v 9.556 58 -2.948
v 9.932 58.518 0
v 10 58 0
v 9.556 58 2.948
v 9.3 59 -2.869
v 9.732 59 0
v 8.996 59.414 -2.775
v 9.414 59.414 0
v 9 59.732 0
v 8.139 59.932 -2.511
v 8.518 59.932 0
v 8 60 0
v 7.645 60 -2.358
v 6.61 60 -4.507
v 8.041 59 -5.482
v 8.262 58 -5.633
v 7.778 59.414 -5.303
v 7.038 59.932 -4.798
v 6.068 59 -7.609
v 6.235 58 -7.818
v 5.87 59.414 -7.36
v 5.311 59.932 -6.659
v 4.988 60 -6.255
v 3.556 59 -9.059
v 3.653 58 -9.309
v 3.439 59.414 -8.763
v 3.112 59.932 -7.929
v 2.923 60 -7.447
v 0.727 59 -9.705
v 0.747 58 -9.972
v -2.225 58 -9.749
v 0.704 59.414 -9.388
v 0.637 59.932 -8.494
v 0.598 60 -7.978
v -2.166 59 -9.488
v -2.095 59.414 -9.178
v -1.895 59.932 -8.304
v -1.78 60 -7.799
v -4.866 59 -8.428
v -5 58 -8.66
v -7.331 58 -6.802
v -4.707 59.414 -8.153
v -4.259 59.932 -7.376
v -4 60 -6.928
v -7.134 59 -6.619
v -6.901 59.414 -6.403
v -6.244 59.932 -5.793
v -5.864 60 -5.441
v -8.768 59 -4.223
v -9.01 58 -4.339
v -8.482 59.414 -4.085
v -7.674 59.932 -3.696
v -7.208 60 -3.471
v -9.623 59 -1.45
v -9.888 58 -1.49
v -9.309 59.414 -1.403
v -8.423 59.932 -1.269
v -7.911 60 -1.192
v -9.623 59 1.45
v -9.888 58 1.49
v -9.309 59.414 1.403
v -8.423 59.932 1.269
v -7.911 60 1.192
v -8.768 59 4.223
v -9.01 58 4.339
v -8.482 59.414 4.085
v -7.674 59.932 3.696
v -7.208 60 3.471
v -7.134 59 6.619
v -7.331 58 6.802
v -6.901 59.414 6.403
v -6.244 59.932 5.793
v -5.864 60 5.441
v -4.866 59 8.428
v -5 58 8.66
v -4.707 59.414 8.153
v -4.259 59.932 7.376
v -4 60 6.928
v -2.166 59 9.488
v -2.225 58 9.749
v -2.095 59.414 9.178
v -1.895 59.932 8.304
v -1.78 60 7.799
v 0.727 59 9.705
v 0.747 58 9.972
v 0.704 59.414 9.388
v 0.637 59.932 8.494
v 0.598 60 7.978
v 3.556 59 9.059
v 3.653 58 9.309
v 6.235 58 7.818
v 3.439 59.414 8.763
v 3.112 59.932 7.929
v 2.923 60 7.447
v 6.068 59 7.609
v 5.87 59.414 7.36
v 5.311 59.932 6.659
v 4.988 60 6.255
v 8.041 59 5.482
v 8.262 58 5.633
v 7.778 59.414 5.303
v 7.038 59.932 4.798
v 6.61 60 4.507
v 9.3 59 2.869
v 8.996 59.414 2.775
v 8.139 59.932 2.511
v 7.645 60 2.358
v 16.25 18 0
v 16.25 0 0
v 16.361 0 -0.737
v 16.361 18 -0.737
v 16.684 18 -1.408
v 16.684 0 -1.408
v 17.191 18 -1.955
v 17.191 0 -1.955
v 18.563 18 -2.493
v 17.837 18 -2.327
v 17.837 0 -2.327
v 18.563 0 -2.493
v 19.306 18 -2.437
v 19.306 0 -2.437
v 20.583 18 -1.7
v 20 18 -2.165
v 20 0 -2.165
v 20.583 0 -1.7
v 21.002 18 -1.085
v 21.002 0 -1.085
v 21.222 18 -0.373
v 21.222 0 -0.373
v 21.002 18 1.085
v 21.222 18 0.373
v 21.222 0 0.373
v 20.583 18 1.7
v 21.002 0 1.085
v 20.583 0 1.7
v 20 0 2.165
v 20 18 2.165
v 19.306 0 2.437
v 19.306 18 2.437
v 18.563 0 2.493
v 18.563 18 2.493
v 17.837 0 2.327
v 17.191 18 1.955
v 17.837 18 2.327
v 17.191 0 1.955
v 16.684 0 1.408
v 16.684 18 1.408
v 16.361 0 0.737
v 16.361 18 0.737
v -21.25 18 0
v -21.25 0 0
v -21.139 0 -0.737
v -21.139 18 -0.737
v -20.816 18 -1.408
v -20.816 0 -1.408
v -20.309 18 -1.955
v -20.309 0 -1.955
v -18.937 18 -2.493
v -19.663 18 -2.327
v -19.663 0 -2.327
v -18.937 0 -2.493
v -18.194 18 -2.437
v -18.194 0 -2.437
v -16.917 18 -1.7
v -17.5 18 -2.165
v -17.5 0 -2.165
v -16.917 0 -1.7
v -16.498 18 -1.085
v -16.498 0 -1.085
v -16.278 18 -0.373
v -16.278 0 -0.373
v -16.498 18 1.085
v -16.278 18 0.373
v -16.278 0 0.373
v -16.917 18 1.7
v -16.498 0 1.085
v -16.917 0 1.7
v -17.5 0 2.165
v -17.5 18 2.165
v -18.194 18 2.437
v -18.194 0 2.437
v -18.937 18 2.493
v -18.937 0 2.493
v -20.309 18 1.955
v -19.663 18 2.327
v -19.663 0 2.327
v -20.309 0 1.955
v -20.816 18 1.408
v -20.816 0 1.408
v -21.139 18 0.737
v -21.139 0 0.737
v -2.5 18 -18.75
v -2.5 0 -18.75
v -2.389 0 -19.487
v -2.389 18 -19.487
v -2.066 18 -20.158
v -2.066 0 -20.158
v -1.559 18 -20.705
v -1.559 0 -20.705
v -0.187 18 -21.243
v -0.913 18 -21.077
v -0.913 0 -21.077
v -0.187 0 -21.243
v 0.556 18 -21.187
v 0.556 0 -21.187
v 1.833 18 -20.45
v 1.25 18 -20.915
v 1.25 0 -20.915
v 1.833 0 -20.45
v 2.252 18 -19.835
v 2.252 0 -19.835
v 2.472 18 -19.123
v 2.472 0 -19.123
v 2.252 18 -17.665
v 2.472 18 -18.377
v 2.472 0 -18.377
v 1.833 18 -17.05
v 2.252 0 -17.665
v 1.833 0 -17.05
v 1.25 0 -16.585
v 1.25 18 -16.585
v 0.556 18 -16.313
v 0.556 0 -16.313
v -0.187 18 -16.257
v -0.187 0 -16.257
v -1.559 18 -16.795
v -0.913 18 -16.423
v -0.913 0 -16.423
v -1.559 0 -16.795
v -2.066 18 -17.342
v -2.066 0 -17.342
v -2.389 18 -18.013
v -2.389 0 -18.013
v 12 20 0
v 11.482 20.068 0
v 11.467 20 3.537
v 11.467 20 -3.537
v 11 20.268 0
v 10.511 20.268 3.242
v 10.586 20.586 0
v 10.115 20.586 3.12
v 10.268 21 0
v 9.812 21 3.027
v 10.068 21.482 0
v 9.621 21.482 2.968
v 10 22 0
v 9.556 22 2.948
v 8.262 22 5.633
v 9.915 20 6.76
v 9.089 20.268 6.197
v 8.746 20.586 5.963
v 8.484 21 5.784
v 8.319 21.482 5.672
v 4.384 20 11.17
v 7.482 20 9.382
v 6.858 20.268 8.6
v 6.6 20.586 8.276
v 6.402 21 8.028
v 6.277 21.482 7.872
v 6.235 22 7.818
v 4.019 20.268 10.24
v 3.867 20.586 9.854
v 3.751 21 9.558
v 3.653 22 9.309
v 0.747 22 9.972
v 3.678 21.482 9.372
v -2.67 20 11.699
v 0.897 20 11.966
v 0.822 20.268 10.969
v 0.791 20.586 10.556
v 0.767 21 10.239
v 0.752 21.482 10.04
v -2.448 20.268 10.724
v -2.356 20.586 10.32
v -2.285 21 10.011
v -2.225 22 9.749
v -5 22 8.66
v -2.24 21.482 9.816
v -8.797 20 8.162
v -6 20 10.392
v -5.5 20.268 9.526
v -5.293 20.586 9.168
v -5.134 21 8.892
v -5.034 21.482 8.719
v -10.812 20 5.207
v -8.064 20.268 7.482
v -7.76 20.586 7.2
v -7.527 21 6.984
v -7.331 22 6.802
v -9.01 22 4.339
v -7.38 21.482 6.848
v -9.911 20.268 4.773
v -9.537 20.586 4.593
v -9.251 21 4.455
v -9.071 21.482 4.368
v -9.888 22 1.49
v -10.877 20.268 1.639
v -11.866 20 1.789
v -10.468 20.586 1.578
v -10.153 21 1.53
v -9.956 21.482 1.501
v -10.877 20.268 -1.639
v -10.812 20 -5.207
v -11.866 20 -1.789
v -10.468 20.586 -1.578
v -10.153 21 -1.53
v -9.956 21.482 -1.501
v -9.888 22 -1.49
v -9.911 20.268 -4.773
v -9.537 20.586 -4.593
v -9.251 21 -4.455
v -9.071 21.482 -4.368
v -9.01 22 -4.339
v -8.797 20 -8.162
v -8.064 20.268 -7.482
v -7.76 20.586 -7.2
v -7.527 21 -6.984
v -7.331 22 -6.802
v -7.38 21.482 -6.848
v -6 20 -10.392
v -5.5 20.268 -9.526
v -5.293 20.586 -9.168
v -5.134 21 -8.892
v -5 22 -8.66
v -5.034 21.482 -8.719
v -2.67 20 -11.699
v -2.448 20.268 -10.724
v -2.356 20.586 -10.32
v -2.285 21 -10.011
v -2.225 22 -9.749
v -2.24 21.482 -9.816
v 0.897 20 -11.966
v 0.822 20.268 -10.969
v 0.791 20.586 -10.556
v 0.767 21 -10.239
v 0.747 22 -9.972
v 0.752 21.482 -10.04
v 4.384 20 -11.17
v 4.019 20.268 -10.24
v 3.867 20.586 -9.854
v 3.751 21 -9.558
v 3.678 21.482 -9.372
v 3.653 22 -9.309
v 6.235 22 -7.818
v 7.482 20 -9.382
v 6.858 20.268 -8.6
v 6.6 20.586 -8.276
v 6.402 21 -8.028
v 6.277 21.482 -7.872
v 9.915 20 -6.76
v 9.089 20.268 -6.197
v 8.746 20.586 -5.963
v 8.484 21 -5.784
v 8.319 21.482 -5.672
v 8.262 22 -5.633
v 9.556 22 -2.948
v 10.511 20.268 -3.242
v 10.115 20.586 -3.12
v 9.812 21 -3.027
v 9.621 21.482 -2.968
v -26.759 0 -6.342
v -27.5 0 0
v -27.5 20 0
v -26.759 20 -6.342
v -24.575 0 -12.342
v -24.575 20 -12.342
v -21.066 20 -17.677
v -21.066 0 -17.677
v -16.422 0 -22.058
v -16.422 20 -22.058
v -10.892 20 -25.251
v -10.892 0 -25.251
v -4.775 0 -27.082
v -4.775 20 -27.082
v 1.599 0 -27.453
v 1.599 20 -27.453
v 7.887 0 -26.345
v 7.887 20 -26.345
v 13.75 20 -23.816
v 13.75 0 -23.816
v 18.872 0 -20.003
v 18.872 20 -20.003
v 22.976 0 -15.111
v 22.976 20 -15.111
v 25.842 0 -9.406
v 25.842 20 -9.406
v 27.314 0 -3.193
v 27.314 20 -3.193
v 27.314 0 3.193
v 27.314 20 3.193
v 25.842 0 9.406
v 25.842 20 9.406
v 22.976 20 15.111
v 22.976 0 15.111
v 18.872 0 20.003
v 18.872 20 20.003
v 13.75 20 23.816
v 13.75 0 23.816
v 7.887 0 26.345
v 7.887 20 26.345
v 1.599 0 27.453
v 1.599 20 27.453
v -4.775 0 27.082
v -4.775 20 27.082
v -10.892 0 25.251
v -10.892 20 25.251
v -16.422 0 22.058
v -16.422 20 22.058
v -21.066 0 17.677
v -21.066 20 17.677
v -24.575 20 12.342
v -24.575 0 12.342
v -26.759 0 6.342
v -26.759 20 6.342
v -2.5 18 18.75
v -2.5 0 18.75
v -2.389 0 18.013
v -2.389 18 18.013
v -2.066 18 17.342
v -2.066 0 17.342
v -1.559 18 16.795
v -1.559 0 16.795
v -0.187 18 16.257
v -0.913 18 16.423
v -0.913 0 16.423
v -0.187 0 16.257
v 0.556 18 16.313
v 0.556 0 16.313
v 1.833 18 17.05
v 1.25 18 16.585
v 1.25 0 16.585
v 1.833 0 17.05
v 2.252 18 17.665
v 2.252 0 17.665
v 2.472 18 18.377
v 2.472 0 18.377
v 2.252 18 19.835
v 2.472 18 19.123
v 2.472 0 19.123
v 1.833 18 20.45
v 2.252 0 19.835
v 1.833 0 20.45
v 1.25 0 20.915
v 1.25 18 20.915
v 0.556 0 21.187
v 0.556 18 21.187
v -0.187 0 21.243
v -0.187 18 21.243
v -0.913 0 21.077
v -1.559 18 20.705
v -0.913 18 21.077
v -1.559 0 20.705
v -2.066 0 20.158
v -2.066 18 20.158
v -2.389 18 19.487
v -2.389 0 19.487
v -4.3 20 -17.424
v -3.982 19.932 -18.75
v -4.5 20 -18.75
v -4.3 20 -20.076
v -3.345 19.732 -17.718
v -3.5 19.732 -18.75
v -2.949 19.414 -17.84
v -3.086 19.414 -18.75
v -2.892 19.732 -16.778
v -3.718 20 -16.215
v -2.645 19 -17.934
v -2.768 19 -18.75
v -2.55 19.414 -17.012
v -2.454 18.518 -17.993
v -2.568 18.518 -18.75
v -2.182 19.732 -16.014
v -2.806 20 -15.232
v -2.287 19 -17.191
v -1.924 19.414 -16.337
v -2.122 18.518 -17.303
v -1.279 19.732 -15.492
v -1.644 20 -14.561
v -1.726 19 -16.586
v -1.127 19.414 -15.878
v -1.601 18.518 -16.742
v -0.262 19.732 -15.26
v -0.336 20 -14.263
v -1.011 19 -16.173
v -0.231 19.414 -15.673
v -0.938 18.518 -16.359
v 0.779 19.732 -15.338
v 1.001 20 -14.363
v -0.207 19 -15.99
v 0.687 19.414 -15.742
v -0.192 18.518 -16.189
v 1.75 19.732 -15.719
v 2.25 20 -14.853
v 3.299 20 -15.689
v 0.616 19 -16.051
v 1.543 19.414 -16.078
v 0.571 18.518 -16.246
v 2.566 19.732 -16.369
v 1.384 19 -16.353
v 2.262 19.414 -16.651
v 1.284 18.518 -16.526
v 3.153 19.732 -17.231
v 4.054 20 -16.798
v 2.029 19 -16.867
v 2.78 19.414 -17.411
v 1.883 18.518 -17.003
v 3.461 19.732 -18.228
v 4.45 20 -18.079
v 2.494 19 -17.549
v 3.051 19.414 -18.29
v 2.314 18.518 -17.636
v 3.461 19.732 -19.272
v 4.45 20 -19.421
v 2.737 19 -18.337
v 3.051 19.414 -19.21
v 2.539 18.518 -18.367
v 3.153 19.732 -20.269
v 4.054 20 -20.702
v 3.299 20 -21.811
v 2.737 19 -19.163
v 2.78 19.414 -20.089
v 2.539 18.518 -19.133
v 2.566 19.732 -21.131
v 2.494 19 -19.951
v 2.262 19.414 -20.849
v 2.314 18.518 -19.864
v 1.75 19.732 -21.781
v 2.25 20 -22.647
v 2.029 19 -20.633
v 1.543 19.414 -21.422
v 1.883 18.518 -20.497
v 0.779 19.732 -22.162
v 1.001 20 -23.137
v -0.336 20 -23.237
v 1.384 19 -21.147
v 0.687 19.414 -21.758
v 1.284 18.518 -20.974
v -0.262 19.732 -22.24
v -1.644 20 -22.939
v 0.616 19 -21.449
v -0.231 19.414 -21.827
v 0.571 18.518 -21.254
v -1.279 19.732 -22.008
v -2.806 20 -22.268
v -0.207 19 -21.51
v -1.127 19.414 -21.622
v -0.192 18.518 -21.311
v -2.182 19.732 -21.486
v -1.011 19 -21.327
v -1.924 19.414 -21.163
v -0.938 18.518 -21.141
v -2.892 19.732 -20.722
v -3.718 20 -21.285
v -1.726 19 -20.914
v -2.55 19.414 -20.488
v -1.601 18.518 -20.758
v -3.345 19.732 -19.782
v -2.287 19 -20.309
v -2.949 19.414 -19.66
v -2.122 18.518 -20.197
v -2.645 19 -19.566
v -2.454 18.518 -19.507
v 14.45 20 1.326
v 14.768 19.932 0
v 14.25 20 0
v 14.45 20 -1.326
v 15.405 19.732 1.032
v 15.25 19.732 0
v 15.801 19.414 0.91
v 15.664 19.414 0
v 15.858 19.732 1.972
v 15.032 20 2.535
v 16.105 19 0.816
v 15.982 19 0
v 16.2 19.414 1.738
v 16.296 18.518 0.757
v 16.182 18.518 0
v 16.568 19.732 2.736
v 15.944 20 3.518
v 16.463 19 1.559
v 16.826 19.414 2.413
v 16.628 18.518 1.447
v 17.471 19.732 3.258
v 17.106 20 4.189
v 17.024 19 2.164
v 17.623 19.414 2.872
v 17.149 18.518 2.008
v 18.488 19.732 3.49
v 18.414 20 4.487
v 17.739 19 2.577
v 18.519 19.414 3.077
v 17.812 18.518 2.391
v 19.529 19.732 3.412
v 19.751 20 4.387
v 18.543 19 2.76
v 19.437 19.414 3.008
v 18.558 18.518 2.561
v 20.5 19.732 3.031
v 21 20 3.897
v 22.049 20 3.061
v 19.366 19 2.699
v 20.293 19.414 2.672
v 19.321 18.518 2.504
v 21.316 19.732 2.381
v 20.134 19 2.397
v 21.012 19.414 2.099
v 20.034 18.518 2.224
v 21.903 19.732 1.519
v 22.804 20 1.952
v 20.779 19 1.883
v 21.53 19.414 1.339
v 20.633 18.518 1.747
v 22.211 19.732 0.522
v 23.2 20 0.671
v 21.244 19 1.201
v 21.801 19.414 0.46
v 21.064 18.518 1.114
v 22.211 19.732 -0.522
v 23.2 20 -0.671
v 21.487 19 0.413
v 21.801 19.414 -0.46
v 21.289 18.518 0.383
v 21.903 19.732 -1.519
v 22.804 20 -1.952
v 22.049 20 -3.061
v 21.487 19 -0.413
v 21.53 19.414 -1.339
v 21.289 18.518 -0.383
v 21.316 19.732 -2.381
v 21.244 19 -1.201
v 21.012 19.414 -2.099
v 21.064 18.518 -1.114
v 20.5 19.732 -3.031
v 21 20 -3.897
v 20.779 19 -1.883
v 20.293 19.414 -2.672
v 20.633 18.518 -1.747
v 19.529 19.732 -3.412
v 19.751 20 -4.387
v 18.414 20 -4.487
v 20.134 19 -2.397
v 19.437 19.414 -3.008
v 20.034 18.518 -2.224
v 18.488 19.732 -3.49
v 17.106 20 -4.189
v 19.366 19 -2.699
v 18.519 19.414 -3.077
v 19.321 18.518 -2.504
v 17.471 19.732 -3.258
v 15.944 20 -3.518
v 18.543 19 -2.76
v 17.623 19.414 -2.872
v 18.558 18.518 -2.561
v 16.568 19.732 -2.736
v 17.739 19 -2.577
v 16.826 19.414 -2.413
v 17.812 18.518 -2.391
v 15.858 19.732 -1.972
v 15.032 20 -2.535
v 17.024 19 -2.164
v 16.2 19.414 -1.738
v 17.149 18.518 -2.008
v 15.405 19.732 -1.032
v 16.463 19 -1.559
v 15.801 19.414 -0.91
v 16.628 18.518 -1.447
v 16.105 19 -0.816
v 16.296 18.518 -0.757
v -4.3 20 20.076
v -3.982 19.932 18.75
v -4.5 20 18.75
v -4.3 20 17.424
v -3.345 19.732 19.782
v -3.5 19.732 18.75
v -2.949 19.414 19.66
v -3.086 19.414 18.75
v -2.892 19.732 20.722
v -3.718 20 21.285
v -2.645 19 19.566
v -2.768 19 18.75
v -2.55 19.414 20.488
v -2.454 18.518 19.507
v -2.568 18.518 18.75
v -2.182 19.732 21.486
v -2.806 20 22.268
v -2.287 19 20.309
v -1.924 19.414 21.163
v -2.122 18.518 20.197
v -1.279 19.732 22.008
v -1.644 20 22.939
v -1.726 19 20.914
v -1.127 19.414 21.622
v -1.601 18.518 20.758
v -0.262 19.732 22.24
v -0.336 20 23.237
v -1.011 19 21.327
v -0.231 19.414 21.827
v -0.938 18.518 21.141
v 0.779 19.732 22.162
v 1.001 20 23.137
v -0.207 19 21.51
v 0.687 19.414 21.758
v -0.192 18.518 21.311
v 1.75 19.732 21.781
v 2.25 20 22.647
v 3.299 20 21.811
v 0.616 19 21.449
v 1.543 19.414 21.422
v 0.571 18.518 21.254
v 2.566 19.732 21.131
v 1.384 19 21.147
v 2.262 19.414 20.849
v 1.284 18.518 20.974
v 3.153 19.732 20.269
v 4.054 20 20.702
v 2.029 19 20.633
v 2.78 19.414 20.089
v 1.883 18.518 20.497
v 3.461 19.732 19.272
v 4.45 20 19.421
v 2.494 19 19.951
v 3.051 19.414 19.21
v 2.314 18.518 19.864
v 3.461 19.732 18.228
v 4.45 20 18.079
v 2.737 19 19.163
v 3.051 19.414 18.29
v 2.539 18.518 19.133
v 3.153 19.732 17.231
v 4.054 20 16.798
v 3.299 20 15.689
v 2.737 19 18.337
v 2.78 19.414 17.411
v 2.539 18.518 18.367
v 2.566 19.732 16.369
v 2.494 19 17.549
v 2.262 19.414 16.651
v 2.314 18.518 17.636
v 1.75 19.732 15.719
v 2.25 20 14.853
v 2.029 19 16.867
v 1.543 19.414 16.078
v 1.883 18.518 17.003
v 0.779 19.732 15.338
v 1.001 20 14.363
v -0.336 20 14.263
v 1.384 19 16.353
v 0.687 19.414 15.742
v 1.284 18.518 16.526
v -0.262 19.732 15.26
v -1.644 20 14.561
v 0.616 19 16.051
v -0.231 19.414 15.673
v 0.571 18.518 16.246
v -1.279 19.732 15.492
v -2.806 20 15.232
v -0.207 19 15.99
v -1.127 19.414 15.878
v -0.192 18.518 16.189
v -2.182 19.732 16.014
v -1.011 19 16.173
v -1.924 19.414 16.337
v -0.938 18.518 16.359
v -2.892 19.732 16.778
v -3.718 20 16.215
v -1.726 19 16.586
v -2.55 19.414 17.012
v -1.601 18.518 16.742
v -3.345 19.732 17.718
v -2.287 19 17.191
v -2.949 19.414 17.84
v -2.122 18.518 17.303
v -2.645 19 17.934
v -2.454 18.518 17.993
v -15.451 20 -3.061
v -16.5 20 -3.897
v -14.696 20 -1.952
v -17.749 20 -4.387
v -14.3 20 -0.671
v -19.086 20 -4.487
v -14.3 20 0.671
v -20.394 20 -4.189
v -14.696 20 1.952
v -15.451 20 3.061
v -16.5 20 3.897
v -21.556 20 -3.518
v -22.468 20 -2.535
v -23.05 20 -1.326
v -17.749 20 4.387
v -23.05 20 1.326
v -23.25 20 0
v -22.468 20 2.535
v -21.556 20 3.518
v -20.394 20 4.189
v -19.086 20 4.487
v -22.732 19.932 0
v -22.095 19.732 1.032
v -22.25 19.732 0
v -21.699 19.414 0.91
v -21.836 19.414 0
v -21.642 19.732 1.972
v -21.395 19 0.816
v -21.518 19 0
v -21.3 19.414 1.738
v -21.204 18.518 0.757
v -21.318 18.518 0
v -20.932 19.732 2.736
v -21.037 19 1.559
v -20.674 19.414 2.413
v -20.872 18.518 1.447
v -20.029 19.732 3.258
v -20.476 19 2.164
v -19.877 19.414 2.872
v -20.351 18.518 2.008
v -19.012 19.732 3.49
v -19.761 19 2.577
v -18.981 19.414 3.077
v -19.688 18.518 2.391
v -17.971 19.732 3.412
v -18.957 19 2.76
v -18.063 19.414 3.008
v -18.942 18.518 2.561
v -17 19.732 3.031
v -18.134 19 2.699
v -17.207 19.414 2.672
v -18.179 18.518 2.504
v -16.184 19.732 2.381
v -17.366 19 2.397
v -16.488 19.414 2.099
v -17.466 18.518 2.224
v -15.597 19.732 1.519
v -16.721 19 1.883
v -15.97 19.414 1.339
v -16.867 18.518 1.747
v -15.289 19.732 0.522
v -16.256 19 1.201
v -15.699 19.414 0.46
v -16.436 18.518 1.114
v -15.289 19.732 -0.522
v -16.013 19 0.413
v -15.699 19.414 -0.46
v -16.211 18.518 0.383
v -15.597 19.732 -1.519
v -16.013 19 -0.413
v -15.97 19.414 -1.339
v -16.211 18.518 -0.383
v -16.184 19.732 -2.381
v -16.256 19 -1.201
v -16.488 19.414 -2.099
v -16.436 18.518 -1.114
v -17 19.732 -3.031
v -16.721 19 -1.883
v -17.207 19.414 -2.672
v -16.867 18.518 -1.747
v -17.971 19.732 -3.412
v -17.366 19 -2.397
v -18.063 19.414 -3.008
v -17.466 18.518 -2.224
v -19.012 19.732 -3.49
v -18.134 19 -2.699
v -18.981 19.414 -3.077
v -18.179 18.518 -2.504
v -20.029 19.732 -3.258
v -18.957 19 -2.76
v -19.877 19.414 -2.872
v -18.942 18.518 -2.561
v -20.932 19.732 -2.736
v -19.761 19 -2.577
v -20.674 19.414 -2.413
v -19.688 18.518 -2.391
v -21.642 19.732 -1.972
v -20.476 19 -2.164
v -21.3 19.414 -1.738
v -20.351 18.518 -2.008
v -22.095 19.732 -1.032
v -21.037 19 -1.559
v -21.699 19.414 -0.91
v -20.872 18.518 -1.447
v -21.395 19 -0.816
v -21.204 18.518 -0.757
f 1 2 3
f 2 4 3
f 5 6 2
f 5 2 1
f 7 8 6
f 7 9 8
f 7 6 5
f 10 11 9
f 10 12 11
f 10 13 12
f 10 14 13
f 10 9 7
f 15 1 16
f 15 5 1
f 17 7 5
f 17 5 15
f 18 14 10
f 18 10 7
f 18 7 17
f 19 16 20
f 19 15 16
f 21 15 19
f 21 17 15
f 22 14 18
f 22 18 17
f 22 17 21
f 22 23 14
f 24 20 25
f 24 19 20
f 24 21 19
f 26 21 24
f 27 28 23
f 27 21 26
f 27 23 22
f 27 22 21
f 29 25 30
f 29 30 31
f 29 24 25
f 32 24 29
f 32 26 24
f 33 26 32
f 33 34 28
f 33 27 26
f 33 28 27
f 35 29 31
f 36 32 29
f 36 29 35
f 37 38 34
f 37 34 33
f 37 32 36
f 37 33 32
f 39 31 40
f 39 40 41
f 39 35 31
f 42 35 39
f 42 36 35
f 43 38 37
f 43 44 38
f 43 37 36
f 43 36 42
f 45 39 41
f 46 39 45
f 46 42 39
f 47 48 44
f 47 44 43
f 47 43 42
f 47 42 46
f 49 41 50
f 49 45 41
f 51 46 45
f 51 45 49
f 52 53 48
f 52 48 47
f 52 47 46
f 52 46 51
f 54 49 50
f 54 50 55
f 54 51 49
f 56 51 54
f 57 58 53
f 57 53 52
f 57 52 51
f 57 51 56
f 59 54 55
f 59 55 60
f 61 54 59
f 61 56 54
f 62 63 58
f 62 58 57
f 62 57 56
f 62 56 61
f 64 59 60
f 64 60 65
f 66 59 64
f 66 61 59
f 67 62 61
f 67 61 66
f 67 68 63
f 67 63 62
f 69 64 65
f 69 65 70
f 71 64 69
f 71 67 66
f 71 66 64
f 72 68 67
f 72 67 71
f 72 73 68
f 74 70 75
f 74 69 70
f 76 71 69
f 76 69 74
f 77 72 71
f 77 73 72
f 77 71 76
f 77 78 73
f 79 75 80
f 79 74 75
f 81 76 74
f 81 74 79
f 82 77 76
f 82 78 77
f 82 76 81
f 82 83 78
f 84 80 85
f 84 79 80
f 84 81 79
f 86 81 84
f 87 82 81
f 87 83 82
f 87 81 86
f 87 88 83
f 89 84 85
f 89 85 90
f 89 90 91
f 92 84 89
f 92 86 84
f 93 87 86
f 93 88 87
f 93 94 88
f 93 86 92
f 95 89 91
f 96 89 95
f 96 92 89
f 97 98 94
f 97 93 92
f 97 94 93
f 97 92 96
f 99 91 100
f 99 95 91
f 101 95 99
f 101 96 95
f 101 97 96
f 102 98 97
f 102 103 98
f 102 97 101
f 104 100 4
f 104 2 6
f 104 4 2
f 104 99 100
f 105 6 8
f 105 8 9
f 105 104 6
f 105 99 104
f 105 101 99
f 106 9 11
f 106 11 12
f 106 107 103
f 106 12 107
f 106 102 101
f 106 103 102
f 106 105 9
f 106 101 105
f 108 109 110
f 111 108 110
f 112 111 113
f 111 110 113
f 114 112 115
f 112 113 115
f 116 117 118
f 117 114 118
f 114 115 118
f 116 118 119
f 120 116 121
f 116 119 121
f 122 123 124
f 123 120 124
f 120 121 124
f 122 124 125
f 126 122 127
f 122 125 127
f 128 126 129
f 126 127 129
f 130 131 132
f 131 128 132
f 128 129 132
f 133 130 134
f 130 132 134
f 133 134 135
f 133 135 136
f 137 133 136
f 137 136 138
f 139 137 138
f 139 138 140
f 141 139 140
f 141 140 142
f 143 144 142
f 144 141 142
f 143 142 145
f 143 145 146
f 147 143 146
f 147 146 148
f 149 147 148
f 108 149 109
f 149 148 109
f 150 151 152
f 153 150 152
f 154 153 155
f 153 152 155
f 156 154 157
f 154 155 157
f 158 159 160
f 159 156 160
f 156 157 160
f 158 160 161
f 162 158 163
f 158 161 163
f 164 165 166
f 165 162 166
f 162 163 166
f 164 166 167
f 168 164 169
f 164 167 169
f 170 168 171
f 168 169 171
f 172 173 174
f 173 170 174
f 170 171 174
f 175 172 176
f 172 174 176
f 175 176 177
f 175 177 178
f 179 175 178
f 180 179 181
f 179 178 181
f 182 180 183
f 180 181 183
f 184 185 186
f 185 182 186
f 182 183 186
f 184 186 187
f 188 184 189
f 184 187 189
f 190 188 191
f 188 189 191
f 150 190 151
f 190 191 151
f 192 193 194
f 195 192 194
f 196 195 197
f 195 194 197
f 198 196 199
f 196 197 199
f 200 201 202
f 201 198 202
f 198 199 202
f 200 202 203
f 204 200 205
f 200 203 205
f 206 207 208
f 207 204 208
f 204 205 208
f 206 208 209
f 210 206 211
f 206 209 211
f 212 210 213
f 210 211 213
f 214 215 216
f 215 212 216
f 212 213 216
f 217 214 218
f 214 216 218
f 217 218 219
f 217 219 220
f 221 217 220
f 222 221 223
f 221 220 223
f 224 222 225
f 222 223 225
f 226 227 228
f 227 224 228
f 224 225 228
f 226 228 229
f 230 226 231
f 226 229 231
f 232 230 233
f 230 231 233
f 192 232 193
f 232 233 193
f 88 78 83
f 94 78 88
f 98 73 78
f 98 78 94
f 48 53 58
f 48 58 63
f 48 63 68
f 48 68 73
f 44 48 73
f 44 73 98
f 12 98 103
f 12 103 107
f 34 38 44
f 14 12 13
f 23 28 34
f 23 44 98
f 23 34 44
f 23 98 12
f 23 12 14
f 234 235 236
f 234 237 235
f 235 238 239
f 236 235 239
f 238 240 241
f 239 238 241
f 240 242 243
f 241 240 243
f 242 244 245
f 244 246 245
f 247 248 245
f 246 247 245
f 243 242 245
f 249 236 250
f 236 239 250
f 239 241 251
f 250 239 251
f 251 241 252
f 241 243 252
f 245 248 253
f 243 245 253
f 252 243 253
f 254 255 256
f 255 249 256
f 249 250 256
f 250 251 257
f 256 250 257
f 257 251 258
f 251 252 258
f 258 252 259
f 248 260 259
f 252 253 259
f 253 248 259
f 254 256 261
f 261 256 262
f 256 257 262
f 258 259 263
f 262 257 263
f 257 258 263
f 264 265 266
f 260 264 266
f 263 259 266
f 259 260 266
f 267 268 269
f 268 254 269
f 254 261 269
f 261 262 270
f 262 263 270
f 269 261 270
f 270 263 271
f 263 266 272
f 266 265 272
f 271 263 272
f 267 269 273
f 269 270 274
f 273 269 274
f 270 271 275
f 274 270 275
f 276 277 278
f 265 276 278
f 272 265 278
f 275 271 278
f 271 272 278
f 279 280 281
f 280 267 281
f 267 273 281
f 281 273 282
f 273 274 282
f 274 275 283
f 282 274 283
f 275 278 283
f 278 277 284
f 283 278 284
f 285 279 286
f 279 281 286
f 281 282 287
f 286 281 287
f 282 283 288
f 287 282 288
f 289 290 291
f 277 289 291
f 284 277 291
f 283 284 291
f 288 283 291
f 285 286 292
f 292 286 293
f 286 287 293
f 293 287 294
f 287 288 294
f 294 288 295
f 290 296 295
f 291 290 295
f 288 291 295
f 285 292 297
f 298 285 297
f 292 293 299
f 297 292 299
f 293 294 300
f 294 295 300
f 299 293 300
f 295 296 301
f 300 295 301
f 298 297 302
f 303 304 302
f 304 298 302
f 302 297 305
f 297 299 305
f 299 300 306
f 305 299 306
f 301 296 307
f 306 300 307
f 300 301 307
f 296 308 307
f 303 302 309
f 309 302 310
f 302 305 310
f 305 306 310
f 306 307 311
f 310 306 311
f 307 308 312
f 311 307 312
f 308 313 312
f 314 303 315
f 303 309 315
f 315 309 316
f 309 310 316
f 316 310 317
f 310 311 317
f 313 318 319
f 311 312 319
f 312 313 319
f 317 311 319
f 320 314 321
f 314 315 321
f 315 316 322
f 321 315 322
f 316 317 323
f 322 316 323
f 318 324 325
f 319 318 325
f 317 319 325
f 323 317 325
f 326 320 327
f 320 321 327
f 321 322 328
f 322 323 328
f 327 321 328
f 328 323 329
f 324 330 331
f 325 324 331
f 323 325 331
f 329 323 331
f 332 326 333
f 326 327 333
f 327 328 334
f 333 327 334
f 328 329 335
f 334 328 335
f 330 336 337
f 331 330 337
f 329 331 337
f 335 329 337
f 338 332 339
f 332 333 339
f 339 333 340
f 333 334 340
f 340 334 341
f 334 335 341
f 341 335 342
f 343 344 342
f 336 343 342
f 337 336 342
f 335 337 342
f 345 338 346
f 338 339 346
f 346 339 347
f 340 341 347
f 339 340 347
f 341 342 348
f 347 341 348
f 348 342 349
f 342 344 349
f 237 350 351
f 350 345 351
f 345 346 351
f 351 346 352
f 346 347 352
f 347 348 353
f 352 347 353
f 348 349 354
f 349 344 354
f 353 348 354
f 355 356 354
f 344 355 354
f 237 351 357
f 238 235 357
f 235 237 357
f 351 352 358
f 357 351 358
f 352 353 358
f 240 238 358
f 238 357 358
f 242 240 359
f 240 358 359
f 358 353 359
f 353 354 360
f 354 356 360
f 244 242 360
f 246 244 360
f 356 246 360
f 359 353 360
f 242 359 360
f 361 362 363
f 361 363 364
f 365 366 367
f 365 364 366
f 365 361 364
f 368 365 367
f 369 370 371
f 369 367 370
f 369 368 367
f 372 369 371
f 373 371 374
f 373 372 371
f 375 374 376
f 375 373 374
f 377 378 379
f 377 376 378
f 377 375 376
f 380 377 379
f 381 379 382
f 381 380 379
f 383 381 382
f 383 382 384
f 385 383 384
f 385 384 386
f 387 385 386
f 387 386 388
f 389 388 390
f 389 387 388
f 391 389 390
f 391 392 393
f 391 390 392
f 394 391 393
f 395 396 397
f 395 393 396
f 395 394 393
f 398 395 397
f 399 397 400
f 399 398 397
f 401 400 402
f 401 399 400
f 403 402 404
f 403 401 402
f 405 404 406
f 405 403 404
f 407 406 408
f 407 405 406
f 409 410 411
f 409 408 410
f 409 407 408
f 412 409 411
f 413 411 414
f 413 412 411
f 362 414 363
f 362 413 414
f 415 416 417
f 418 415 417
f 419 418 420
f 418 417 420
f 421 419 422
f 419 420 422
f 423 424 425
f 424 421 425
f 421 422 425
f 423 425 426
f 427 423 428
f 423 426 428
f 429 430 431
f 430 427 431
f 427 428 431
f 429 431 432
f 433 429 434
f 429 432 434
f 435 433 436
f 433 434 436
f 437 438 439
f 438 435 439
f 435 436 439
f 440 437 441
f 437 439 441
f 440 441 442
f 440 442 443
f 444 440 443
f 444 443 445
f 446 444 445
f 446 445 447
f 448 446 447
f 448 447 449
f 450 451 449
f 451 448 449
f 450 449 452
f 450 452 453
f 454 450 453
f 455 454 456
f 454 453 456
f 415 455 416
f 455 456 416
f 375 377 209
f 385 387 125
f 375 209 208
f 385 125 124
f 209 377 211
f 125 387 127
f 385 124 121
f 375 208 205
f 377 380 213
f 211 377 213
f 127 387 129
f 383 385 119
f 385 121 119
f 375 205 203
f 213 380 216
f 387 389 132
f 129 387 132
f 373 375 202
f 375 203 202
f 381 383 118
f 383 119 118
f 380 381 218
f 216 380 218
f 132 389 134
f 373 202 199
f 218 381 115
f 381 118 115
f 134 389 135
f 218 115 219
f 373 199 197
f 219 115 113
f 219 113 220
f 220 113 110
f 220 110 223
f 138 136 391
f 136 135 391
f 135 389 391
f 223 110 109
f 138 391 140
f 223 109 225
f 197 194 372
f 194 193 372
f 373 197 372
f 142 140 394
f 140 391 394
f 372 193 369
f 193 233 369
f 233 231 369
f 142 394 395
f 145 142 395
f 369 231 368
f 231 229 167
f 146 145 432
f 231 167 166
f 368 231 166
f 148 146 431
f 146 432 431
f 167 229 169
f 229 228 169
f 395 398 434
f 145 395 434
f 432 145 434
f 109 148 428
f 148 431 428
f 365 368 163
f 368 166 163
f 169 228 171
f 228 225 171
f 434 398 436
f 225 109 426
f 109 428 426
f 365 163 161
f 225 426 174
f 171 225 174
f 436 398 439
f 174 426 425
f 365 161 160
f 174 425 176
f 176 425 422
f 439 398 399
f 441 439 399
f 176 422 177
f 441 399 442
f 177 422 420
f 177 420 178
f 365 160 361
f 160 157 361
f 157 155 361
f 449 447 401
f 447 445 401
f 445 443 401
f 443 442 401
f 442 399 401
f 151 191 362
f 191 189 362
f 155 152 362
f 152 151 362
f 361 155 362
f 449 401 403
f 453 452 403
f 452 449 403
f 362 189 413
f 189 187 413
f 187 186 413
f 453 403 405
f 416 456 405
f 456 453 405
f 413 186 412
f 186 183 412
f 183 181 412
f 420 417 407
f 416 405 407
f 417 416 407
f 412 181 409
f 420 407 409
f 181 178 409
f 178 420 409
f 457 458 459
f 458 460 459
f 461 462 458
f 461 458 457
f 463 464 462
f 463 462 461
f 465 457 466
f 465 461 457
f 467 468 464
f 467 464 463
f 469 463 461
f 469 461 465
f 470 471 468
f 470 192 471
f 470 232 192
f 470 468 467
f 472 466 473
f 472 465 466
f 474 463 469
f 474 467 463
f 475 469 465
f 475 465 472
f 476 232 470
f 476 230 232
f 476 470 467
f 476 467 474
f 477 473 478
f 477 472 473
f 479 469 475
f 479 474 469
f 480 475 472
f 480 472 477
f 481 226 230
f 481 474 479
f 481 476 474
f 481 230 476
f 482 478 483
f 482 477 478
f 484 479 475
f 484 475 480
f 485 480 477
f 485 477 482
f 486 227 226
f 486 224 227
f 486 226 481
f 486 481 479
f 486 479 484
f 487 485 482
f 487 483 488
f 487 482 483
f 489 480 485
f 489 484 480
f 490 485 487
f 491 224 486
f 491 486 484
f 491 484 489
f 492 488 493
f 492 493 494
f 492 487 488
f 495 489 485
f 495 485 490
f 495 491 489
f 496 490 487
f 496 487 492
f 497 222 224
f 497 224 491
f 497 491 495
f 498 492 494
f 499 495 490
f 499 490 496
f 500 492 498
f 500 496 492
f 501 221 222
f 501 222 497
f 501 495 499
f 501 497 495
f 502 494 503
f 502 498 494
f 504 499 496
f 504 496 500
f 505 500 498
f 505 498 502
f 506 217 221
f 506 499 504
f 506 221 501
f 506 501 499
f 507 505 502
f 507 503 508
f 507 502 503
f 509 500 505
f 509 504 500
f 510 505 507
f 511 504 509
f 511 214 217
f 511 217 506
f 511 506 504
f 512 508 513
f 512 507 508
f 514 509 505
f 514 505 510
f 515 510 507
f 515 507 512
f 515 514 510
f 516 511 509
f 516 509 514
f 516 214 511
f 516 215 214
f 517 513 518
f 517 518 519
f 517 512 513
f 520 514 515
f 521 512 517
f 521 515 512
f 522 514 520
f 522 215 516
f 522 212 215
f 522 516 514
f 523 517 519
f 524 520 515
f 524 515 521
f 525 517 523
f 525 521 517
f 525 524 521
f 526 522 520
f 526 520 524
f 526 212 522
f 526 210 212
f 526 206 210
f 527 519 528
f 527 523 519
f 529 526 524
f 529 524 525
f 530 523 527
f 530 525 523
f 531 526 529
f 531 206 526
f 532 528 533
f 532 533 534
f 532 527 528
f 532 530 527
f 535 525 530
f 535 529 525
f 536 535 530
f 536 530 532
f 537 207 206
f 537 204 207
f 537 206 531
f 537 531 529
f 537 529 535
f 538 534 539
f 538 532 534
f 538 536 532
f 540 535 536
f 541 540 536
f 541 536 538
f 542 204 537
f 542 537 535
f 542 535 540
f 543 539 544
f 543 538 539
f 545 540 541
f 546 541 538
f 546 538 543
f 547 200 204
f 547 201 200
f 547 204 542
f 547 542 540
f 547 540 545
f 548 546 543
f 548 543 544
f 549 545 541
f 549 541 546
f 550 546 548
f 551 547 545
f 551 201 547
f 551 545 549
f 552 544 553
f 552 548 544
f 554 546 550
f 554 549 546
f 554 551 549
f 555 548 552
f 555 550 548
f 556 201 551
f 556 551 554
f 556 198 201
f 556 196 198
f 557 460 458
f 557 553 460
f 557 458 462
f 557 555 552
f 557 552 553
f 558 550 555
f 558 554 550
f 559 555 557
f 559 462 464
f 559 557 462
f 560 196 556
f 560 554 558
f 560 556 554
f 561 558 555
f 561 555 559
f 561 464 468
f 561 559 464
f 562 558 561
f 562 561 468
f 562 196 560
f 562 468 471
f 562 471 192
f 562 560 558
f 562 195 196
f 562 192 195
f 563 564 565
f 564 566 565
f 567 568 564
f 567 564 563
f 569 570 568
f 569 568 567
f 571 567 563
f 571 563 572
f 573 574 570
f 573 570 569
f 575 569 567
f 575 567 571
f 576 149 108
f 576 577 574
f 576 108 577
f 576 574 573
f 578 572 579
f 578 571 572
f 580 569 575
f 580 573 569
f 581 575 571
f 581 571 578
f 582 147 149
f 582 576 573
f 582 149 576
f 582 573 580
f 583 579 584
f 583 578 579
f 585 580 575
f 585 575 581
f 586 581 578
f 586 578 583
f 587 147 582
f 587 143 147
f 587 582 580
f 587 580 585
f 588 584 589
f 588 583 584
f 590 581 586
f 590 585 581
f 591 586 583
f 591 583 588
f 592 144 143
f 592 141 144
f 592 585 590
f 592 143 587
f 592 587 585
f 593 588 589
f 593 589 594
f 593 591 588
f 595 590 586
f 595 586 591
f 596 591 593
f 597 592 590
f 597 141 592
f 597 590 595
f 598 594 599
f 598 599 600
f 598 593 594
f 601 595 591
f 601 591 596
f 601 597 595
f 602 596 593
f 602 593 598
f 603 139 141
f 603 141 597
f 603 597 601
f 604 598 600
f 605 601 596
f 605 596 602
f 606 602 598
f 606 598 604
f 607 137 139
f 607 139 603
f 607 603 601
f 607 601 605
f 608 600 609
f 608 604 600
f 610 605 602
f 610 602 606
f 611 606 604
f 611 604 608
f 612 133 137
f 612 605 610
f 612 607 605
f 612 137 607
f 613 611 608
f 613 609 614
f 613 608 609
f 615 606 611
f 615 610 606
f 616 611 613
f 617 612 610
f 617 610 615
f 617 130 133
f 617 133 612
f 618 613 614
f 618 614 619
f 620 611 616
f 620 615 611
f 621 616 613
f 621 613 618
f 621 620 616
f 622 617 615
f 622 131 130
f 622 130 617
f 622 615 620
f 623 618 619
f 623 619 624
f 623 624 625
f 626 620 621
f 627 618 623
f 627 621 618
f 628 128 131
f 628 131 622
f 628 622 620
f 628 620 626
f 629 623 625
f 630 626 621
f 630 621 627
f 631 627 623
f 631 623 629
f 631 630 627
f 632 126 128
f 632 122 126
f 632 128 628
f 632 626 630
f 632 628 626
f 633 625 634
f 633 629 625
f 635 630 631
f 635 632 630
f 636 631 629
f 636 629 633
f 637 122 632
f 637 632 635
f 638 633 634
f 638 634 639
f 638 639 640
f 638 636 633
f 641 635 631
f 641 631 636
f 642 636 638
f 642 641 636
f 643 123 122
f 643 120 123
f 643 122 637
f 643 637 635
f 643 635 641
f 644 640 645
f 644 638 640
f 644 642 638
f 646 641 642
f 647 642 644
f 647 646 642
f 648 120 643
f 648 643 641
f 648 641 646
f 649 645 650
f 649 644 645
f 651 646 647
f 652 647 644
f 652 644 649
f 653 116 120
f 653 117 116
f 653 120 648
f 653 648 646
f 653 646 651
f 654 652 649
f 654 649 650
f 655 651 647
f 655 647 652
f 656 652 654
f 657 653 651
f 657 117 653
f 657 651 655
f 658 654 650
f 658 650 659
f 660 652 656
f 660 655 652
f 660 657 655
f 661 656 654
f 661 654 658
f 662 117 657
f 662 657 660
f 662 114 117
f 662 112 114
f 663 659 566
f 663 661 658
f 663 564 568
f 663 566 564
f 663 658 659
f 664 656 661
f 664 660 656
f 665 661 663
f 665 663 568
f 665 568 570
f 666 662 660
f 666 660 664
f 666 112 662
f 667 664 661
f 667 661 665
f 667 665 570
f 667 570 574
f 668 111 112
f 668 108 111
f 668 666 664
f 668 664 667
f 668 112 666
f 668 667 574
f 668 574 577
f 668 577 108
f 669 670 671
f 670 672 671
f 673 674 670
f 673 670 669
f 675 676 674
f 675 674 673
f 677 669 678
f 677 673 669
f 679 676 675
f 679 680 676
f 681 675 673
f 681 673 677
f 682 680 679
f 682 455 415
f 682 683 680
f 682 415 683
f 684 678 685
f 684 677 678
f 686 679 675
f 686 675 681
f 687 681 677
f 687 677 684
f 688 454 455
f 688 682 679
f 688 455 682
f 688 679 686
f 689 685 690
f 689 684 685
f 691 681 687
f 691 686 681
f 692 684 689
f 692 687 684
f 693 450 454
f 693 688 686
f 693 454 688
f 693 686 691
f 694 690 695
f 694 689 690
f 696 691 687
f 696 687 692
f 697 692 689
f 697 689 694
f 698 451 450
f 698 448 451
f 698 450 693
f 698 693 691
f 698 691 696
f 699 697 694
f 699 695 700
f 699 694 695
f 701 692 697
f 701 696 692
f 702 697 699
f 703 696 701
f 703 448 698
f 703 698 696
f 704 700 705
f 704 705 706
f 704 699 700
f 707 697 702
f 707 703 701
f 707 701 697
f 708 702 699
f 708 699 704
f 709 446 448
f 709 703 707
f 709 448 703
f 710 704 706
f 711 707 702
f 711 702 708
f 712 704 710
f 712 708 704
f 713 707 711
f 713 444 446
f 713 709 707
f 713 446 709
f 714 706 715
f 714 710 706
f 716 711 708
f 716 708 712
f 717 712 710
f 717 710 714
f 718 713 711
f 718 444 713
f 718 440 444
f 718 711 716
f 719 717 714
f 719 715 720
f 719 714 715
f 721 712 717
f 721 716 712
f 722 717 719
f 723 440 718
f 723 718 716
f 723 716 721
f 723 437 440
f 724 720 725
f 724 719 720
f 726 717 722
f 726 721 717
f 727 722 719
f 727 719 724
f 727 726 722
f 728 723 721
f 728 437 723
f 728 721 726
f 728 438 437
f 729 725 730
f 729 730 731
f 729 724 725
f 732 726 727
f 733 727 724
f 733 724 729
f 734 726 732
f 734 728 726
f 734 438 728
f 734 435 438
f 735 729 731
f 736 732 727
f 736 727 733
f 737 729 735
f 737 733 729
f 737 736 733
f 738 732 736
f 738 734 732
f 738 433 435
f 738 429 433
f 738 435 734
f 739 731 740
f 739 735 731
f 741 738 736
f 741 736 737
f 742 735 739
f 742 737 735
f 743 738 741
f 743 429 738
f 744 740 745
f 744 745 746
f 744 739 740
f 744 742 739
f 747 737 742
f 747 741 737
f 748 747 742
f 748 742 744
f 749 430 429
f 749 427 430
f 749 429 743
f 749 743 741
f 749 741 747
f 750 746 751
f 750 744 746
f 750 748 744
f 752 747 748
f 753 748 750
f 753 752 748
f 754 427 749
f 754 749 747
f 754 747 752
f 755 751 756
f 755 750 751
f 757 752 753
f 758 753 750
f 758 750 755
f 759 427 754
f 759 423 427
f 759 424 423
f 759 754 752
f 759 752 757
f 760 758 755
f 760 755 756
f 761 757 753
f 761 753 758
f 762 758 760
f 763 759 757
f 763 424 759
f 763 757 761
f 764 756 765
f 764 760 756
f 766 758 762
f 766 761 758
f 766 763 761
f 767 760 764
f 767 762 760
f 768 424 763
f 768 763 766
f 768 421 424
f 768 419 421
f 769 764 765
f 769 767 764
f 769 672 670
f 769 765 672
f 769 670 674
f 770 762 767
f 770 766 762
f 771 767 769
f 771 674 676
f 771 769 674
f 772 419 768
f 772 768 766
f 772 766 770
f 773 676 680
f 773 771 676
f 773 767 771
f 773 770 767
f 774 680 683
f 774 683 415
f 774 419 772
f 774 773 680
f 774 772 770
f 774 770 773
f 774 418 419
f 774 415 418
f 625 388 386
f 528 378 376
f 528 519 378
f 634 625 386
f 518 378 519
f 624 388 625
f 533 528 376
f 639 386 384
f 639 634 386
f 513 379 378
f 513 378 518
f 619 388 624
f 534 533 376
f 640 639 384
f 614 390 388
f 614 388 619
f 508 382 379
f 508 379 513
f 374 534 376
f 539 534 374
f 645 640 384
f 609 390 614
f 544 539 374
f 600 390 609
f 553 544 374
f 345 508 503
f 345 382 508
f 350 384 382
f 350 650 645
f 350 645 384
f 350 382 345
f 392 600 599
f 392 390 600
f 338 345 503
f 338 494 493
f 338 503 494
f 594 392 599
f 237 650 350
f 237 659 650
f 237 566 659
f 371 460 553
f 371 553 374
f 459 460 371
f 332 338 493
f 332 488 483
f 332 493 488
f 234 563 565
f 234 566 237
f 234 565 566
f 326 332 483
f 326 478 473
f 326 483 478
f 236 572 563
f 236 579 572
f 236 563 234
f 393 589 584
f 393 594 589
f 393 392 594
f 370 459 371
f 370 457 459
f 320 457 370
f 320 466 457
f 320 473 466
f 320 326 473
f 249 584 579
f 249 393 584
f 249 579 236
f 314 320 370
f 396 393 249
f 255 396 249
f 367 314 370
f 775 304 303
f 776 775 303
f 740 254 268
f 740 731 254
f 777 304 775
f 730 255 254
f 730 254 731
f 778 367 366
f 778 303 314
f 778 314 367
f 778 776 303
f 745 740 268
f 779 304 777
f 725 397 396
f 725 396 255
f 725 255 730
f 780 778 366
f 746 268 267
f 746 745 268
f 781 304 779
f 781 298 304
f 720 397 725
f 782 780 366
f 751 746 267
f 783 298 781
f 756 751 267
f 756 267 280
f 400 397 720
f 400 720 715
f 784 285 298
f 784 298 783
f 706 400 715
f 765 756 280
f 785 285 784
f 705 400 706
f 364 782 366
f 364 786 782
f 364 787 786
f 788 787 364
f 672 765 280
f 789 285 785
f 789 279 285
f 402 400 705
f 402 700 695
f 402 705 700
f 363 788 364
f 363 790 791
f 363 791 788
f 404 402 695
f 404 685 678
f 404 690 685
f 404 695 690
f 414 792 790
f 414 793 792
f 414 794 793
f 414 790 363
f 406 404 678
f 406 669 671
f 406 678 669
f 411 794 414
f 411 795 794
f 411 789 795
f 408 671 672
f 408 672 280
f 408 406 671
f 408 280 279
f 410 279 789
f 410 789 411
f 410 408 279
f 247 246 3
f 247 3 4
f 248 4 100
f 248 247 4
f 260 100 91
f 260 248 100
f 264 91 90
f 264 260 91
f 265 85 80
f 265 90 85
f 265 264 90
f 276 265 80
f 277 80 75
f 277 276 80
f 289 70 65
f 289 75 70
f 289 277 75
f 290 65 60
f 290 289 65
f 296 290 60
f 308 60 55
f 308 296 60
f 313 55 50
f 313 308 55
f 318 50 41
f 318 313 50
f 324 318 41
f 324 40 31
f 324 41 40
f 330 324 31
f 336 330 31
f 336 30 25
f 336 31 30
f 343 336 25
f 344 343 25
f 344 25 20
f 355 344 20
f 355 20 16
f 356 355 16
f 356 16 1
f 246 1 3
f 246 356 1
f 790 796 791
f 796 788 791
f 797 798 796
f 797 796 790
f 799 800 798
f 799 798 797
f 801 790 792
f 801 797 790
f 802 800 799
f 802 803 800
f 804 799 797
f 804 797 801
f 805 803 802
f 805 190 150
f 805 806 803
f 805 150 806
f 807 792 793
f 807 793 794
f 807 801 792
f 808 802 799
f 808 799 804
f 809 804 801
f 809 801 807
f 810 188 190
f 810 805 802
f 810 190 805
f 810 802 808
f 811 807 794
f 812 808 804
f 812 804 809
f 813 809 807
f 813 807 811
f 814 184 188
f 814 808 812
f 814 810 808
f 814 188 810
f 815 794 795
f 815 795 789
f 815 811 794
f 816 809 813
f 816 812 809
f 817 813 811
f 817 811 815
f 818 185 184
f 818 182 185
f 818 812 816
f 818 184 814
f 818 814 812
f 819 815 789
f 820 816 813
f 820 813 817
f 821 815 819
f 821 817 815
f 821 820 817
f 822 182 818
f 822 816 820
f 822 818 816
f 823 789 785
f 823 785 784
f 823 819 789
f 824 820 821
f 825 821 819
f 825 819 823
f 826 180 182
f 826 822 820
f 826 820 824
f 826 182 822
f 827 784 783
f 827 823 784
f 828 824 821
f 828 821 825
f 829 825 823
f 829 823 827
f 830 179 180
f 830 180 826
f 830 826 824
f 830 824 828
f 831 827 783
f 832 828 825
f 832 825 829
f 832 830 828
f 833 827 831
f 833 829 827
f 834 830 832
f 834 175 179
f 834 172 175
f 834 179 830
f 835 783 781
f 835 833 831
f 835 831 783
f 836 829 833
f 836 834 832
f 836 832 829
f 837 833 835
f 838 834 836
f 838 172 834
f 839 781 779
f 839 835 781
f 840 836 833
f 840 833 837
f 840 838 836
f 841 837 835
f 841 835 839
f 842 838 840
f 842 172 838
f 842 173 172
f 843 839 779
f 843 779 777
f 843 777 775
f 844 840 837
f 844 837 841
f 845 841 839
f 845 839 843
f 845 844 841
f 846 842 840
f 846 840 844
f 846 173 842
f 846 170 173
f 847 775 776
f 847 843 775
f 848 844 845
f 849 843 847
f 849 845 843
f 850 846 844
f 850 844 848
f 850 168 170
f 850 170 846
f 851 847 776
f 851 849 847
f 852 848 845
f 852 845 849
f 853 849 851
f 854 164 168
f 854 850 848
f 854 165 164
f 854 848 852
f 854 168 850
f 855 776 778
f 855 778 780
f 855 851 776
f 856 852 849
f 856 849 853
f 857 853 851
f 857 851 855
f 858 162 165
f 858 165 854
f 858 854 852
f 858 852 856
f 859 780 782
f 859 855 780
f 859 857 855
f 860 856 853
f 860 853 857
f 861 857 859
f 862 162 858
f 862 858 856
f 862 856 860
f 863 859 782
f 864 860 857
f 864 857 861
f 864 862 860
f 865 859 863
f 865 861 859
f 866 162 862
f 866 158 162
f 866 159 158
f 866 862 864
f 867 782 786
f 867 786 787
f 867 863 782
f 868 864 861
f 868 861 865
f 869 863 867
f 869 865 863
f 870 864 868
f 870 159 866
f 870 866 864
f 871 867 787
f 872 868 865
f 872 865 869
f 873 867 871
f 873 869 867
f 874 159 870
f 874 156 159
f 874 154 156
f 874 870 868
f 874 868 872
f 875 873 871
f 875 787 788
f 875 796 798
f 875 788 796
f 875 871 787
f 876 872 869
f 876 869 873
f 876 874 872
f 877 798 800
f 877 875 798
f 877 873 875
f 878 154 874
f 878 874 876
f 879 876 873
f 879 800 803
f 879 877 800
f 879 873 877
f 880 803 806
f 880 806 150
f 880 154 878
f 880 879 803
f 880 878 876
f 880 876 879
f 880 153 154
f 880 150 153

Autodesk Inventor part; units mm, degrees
ref_plane "YZ Plane" through (0, 0, 0) normal (1, 0, 0) x (0, 1, 0)
ref_plane "XZ Plane" through (0, 0, 0) normal (0, 1, 0) x (-1, 0, 0)
ref_plane "XY Plane" through (0, 0, 0) normal (0, 0, 1) x (1, 0, 0)
sketch "Sketch3" plane through (0, 0, 0) normal (0, 1, 0) x (-1, 0, 0)
  circle A0 centre (0, 0) radius 27.5
  circle A1 centre (18.75, 0) radius 2.5
  circle A2 centre (0, -18.75) radius 2.5
  circle A3 centre (-18.75, 0) radius 2.5
  circle A4 centre (0, 18.75) radius 2.5
  dimension "d15" = 55
  dimension "d17" = 5
  dimension "d18" = 5
  dimension "d19" = 5
  dimension "d20" = 5
extrude "Extrusion3" add sketch "Sketch3" along normal blind 20
sketch "Sketch4" plane through (0, 20, 0) normal (0, 1, 0) x (1, 0, 0)
  circle A0 centre (0, 0) radius 10
  dimension "d23" = 20
extrude "Extrusion4" add sketch "Sketch4" along normal blind 40
fillet "Fillet5" radius 2 6 edges at (-10, 60, 0) (21.25, 20, 0) (2.5, 20, -18.75) (-16.25, 20, 0) (2.5, 20, 18.75) (-10, 20, 0)
thread "Thread2" size "M55x4" class "6g" standard "ANSI Metric M Profile" full length
properties part number "Disco2"
